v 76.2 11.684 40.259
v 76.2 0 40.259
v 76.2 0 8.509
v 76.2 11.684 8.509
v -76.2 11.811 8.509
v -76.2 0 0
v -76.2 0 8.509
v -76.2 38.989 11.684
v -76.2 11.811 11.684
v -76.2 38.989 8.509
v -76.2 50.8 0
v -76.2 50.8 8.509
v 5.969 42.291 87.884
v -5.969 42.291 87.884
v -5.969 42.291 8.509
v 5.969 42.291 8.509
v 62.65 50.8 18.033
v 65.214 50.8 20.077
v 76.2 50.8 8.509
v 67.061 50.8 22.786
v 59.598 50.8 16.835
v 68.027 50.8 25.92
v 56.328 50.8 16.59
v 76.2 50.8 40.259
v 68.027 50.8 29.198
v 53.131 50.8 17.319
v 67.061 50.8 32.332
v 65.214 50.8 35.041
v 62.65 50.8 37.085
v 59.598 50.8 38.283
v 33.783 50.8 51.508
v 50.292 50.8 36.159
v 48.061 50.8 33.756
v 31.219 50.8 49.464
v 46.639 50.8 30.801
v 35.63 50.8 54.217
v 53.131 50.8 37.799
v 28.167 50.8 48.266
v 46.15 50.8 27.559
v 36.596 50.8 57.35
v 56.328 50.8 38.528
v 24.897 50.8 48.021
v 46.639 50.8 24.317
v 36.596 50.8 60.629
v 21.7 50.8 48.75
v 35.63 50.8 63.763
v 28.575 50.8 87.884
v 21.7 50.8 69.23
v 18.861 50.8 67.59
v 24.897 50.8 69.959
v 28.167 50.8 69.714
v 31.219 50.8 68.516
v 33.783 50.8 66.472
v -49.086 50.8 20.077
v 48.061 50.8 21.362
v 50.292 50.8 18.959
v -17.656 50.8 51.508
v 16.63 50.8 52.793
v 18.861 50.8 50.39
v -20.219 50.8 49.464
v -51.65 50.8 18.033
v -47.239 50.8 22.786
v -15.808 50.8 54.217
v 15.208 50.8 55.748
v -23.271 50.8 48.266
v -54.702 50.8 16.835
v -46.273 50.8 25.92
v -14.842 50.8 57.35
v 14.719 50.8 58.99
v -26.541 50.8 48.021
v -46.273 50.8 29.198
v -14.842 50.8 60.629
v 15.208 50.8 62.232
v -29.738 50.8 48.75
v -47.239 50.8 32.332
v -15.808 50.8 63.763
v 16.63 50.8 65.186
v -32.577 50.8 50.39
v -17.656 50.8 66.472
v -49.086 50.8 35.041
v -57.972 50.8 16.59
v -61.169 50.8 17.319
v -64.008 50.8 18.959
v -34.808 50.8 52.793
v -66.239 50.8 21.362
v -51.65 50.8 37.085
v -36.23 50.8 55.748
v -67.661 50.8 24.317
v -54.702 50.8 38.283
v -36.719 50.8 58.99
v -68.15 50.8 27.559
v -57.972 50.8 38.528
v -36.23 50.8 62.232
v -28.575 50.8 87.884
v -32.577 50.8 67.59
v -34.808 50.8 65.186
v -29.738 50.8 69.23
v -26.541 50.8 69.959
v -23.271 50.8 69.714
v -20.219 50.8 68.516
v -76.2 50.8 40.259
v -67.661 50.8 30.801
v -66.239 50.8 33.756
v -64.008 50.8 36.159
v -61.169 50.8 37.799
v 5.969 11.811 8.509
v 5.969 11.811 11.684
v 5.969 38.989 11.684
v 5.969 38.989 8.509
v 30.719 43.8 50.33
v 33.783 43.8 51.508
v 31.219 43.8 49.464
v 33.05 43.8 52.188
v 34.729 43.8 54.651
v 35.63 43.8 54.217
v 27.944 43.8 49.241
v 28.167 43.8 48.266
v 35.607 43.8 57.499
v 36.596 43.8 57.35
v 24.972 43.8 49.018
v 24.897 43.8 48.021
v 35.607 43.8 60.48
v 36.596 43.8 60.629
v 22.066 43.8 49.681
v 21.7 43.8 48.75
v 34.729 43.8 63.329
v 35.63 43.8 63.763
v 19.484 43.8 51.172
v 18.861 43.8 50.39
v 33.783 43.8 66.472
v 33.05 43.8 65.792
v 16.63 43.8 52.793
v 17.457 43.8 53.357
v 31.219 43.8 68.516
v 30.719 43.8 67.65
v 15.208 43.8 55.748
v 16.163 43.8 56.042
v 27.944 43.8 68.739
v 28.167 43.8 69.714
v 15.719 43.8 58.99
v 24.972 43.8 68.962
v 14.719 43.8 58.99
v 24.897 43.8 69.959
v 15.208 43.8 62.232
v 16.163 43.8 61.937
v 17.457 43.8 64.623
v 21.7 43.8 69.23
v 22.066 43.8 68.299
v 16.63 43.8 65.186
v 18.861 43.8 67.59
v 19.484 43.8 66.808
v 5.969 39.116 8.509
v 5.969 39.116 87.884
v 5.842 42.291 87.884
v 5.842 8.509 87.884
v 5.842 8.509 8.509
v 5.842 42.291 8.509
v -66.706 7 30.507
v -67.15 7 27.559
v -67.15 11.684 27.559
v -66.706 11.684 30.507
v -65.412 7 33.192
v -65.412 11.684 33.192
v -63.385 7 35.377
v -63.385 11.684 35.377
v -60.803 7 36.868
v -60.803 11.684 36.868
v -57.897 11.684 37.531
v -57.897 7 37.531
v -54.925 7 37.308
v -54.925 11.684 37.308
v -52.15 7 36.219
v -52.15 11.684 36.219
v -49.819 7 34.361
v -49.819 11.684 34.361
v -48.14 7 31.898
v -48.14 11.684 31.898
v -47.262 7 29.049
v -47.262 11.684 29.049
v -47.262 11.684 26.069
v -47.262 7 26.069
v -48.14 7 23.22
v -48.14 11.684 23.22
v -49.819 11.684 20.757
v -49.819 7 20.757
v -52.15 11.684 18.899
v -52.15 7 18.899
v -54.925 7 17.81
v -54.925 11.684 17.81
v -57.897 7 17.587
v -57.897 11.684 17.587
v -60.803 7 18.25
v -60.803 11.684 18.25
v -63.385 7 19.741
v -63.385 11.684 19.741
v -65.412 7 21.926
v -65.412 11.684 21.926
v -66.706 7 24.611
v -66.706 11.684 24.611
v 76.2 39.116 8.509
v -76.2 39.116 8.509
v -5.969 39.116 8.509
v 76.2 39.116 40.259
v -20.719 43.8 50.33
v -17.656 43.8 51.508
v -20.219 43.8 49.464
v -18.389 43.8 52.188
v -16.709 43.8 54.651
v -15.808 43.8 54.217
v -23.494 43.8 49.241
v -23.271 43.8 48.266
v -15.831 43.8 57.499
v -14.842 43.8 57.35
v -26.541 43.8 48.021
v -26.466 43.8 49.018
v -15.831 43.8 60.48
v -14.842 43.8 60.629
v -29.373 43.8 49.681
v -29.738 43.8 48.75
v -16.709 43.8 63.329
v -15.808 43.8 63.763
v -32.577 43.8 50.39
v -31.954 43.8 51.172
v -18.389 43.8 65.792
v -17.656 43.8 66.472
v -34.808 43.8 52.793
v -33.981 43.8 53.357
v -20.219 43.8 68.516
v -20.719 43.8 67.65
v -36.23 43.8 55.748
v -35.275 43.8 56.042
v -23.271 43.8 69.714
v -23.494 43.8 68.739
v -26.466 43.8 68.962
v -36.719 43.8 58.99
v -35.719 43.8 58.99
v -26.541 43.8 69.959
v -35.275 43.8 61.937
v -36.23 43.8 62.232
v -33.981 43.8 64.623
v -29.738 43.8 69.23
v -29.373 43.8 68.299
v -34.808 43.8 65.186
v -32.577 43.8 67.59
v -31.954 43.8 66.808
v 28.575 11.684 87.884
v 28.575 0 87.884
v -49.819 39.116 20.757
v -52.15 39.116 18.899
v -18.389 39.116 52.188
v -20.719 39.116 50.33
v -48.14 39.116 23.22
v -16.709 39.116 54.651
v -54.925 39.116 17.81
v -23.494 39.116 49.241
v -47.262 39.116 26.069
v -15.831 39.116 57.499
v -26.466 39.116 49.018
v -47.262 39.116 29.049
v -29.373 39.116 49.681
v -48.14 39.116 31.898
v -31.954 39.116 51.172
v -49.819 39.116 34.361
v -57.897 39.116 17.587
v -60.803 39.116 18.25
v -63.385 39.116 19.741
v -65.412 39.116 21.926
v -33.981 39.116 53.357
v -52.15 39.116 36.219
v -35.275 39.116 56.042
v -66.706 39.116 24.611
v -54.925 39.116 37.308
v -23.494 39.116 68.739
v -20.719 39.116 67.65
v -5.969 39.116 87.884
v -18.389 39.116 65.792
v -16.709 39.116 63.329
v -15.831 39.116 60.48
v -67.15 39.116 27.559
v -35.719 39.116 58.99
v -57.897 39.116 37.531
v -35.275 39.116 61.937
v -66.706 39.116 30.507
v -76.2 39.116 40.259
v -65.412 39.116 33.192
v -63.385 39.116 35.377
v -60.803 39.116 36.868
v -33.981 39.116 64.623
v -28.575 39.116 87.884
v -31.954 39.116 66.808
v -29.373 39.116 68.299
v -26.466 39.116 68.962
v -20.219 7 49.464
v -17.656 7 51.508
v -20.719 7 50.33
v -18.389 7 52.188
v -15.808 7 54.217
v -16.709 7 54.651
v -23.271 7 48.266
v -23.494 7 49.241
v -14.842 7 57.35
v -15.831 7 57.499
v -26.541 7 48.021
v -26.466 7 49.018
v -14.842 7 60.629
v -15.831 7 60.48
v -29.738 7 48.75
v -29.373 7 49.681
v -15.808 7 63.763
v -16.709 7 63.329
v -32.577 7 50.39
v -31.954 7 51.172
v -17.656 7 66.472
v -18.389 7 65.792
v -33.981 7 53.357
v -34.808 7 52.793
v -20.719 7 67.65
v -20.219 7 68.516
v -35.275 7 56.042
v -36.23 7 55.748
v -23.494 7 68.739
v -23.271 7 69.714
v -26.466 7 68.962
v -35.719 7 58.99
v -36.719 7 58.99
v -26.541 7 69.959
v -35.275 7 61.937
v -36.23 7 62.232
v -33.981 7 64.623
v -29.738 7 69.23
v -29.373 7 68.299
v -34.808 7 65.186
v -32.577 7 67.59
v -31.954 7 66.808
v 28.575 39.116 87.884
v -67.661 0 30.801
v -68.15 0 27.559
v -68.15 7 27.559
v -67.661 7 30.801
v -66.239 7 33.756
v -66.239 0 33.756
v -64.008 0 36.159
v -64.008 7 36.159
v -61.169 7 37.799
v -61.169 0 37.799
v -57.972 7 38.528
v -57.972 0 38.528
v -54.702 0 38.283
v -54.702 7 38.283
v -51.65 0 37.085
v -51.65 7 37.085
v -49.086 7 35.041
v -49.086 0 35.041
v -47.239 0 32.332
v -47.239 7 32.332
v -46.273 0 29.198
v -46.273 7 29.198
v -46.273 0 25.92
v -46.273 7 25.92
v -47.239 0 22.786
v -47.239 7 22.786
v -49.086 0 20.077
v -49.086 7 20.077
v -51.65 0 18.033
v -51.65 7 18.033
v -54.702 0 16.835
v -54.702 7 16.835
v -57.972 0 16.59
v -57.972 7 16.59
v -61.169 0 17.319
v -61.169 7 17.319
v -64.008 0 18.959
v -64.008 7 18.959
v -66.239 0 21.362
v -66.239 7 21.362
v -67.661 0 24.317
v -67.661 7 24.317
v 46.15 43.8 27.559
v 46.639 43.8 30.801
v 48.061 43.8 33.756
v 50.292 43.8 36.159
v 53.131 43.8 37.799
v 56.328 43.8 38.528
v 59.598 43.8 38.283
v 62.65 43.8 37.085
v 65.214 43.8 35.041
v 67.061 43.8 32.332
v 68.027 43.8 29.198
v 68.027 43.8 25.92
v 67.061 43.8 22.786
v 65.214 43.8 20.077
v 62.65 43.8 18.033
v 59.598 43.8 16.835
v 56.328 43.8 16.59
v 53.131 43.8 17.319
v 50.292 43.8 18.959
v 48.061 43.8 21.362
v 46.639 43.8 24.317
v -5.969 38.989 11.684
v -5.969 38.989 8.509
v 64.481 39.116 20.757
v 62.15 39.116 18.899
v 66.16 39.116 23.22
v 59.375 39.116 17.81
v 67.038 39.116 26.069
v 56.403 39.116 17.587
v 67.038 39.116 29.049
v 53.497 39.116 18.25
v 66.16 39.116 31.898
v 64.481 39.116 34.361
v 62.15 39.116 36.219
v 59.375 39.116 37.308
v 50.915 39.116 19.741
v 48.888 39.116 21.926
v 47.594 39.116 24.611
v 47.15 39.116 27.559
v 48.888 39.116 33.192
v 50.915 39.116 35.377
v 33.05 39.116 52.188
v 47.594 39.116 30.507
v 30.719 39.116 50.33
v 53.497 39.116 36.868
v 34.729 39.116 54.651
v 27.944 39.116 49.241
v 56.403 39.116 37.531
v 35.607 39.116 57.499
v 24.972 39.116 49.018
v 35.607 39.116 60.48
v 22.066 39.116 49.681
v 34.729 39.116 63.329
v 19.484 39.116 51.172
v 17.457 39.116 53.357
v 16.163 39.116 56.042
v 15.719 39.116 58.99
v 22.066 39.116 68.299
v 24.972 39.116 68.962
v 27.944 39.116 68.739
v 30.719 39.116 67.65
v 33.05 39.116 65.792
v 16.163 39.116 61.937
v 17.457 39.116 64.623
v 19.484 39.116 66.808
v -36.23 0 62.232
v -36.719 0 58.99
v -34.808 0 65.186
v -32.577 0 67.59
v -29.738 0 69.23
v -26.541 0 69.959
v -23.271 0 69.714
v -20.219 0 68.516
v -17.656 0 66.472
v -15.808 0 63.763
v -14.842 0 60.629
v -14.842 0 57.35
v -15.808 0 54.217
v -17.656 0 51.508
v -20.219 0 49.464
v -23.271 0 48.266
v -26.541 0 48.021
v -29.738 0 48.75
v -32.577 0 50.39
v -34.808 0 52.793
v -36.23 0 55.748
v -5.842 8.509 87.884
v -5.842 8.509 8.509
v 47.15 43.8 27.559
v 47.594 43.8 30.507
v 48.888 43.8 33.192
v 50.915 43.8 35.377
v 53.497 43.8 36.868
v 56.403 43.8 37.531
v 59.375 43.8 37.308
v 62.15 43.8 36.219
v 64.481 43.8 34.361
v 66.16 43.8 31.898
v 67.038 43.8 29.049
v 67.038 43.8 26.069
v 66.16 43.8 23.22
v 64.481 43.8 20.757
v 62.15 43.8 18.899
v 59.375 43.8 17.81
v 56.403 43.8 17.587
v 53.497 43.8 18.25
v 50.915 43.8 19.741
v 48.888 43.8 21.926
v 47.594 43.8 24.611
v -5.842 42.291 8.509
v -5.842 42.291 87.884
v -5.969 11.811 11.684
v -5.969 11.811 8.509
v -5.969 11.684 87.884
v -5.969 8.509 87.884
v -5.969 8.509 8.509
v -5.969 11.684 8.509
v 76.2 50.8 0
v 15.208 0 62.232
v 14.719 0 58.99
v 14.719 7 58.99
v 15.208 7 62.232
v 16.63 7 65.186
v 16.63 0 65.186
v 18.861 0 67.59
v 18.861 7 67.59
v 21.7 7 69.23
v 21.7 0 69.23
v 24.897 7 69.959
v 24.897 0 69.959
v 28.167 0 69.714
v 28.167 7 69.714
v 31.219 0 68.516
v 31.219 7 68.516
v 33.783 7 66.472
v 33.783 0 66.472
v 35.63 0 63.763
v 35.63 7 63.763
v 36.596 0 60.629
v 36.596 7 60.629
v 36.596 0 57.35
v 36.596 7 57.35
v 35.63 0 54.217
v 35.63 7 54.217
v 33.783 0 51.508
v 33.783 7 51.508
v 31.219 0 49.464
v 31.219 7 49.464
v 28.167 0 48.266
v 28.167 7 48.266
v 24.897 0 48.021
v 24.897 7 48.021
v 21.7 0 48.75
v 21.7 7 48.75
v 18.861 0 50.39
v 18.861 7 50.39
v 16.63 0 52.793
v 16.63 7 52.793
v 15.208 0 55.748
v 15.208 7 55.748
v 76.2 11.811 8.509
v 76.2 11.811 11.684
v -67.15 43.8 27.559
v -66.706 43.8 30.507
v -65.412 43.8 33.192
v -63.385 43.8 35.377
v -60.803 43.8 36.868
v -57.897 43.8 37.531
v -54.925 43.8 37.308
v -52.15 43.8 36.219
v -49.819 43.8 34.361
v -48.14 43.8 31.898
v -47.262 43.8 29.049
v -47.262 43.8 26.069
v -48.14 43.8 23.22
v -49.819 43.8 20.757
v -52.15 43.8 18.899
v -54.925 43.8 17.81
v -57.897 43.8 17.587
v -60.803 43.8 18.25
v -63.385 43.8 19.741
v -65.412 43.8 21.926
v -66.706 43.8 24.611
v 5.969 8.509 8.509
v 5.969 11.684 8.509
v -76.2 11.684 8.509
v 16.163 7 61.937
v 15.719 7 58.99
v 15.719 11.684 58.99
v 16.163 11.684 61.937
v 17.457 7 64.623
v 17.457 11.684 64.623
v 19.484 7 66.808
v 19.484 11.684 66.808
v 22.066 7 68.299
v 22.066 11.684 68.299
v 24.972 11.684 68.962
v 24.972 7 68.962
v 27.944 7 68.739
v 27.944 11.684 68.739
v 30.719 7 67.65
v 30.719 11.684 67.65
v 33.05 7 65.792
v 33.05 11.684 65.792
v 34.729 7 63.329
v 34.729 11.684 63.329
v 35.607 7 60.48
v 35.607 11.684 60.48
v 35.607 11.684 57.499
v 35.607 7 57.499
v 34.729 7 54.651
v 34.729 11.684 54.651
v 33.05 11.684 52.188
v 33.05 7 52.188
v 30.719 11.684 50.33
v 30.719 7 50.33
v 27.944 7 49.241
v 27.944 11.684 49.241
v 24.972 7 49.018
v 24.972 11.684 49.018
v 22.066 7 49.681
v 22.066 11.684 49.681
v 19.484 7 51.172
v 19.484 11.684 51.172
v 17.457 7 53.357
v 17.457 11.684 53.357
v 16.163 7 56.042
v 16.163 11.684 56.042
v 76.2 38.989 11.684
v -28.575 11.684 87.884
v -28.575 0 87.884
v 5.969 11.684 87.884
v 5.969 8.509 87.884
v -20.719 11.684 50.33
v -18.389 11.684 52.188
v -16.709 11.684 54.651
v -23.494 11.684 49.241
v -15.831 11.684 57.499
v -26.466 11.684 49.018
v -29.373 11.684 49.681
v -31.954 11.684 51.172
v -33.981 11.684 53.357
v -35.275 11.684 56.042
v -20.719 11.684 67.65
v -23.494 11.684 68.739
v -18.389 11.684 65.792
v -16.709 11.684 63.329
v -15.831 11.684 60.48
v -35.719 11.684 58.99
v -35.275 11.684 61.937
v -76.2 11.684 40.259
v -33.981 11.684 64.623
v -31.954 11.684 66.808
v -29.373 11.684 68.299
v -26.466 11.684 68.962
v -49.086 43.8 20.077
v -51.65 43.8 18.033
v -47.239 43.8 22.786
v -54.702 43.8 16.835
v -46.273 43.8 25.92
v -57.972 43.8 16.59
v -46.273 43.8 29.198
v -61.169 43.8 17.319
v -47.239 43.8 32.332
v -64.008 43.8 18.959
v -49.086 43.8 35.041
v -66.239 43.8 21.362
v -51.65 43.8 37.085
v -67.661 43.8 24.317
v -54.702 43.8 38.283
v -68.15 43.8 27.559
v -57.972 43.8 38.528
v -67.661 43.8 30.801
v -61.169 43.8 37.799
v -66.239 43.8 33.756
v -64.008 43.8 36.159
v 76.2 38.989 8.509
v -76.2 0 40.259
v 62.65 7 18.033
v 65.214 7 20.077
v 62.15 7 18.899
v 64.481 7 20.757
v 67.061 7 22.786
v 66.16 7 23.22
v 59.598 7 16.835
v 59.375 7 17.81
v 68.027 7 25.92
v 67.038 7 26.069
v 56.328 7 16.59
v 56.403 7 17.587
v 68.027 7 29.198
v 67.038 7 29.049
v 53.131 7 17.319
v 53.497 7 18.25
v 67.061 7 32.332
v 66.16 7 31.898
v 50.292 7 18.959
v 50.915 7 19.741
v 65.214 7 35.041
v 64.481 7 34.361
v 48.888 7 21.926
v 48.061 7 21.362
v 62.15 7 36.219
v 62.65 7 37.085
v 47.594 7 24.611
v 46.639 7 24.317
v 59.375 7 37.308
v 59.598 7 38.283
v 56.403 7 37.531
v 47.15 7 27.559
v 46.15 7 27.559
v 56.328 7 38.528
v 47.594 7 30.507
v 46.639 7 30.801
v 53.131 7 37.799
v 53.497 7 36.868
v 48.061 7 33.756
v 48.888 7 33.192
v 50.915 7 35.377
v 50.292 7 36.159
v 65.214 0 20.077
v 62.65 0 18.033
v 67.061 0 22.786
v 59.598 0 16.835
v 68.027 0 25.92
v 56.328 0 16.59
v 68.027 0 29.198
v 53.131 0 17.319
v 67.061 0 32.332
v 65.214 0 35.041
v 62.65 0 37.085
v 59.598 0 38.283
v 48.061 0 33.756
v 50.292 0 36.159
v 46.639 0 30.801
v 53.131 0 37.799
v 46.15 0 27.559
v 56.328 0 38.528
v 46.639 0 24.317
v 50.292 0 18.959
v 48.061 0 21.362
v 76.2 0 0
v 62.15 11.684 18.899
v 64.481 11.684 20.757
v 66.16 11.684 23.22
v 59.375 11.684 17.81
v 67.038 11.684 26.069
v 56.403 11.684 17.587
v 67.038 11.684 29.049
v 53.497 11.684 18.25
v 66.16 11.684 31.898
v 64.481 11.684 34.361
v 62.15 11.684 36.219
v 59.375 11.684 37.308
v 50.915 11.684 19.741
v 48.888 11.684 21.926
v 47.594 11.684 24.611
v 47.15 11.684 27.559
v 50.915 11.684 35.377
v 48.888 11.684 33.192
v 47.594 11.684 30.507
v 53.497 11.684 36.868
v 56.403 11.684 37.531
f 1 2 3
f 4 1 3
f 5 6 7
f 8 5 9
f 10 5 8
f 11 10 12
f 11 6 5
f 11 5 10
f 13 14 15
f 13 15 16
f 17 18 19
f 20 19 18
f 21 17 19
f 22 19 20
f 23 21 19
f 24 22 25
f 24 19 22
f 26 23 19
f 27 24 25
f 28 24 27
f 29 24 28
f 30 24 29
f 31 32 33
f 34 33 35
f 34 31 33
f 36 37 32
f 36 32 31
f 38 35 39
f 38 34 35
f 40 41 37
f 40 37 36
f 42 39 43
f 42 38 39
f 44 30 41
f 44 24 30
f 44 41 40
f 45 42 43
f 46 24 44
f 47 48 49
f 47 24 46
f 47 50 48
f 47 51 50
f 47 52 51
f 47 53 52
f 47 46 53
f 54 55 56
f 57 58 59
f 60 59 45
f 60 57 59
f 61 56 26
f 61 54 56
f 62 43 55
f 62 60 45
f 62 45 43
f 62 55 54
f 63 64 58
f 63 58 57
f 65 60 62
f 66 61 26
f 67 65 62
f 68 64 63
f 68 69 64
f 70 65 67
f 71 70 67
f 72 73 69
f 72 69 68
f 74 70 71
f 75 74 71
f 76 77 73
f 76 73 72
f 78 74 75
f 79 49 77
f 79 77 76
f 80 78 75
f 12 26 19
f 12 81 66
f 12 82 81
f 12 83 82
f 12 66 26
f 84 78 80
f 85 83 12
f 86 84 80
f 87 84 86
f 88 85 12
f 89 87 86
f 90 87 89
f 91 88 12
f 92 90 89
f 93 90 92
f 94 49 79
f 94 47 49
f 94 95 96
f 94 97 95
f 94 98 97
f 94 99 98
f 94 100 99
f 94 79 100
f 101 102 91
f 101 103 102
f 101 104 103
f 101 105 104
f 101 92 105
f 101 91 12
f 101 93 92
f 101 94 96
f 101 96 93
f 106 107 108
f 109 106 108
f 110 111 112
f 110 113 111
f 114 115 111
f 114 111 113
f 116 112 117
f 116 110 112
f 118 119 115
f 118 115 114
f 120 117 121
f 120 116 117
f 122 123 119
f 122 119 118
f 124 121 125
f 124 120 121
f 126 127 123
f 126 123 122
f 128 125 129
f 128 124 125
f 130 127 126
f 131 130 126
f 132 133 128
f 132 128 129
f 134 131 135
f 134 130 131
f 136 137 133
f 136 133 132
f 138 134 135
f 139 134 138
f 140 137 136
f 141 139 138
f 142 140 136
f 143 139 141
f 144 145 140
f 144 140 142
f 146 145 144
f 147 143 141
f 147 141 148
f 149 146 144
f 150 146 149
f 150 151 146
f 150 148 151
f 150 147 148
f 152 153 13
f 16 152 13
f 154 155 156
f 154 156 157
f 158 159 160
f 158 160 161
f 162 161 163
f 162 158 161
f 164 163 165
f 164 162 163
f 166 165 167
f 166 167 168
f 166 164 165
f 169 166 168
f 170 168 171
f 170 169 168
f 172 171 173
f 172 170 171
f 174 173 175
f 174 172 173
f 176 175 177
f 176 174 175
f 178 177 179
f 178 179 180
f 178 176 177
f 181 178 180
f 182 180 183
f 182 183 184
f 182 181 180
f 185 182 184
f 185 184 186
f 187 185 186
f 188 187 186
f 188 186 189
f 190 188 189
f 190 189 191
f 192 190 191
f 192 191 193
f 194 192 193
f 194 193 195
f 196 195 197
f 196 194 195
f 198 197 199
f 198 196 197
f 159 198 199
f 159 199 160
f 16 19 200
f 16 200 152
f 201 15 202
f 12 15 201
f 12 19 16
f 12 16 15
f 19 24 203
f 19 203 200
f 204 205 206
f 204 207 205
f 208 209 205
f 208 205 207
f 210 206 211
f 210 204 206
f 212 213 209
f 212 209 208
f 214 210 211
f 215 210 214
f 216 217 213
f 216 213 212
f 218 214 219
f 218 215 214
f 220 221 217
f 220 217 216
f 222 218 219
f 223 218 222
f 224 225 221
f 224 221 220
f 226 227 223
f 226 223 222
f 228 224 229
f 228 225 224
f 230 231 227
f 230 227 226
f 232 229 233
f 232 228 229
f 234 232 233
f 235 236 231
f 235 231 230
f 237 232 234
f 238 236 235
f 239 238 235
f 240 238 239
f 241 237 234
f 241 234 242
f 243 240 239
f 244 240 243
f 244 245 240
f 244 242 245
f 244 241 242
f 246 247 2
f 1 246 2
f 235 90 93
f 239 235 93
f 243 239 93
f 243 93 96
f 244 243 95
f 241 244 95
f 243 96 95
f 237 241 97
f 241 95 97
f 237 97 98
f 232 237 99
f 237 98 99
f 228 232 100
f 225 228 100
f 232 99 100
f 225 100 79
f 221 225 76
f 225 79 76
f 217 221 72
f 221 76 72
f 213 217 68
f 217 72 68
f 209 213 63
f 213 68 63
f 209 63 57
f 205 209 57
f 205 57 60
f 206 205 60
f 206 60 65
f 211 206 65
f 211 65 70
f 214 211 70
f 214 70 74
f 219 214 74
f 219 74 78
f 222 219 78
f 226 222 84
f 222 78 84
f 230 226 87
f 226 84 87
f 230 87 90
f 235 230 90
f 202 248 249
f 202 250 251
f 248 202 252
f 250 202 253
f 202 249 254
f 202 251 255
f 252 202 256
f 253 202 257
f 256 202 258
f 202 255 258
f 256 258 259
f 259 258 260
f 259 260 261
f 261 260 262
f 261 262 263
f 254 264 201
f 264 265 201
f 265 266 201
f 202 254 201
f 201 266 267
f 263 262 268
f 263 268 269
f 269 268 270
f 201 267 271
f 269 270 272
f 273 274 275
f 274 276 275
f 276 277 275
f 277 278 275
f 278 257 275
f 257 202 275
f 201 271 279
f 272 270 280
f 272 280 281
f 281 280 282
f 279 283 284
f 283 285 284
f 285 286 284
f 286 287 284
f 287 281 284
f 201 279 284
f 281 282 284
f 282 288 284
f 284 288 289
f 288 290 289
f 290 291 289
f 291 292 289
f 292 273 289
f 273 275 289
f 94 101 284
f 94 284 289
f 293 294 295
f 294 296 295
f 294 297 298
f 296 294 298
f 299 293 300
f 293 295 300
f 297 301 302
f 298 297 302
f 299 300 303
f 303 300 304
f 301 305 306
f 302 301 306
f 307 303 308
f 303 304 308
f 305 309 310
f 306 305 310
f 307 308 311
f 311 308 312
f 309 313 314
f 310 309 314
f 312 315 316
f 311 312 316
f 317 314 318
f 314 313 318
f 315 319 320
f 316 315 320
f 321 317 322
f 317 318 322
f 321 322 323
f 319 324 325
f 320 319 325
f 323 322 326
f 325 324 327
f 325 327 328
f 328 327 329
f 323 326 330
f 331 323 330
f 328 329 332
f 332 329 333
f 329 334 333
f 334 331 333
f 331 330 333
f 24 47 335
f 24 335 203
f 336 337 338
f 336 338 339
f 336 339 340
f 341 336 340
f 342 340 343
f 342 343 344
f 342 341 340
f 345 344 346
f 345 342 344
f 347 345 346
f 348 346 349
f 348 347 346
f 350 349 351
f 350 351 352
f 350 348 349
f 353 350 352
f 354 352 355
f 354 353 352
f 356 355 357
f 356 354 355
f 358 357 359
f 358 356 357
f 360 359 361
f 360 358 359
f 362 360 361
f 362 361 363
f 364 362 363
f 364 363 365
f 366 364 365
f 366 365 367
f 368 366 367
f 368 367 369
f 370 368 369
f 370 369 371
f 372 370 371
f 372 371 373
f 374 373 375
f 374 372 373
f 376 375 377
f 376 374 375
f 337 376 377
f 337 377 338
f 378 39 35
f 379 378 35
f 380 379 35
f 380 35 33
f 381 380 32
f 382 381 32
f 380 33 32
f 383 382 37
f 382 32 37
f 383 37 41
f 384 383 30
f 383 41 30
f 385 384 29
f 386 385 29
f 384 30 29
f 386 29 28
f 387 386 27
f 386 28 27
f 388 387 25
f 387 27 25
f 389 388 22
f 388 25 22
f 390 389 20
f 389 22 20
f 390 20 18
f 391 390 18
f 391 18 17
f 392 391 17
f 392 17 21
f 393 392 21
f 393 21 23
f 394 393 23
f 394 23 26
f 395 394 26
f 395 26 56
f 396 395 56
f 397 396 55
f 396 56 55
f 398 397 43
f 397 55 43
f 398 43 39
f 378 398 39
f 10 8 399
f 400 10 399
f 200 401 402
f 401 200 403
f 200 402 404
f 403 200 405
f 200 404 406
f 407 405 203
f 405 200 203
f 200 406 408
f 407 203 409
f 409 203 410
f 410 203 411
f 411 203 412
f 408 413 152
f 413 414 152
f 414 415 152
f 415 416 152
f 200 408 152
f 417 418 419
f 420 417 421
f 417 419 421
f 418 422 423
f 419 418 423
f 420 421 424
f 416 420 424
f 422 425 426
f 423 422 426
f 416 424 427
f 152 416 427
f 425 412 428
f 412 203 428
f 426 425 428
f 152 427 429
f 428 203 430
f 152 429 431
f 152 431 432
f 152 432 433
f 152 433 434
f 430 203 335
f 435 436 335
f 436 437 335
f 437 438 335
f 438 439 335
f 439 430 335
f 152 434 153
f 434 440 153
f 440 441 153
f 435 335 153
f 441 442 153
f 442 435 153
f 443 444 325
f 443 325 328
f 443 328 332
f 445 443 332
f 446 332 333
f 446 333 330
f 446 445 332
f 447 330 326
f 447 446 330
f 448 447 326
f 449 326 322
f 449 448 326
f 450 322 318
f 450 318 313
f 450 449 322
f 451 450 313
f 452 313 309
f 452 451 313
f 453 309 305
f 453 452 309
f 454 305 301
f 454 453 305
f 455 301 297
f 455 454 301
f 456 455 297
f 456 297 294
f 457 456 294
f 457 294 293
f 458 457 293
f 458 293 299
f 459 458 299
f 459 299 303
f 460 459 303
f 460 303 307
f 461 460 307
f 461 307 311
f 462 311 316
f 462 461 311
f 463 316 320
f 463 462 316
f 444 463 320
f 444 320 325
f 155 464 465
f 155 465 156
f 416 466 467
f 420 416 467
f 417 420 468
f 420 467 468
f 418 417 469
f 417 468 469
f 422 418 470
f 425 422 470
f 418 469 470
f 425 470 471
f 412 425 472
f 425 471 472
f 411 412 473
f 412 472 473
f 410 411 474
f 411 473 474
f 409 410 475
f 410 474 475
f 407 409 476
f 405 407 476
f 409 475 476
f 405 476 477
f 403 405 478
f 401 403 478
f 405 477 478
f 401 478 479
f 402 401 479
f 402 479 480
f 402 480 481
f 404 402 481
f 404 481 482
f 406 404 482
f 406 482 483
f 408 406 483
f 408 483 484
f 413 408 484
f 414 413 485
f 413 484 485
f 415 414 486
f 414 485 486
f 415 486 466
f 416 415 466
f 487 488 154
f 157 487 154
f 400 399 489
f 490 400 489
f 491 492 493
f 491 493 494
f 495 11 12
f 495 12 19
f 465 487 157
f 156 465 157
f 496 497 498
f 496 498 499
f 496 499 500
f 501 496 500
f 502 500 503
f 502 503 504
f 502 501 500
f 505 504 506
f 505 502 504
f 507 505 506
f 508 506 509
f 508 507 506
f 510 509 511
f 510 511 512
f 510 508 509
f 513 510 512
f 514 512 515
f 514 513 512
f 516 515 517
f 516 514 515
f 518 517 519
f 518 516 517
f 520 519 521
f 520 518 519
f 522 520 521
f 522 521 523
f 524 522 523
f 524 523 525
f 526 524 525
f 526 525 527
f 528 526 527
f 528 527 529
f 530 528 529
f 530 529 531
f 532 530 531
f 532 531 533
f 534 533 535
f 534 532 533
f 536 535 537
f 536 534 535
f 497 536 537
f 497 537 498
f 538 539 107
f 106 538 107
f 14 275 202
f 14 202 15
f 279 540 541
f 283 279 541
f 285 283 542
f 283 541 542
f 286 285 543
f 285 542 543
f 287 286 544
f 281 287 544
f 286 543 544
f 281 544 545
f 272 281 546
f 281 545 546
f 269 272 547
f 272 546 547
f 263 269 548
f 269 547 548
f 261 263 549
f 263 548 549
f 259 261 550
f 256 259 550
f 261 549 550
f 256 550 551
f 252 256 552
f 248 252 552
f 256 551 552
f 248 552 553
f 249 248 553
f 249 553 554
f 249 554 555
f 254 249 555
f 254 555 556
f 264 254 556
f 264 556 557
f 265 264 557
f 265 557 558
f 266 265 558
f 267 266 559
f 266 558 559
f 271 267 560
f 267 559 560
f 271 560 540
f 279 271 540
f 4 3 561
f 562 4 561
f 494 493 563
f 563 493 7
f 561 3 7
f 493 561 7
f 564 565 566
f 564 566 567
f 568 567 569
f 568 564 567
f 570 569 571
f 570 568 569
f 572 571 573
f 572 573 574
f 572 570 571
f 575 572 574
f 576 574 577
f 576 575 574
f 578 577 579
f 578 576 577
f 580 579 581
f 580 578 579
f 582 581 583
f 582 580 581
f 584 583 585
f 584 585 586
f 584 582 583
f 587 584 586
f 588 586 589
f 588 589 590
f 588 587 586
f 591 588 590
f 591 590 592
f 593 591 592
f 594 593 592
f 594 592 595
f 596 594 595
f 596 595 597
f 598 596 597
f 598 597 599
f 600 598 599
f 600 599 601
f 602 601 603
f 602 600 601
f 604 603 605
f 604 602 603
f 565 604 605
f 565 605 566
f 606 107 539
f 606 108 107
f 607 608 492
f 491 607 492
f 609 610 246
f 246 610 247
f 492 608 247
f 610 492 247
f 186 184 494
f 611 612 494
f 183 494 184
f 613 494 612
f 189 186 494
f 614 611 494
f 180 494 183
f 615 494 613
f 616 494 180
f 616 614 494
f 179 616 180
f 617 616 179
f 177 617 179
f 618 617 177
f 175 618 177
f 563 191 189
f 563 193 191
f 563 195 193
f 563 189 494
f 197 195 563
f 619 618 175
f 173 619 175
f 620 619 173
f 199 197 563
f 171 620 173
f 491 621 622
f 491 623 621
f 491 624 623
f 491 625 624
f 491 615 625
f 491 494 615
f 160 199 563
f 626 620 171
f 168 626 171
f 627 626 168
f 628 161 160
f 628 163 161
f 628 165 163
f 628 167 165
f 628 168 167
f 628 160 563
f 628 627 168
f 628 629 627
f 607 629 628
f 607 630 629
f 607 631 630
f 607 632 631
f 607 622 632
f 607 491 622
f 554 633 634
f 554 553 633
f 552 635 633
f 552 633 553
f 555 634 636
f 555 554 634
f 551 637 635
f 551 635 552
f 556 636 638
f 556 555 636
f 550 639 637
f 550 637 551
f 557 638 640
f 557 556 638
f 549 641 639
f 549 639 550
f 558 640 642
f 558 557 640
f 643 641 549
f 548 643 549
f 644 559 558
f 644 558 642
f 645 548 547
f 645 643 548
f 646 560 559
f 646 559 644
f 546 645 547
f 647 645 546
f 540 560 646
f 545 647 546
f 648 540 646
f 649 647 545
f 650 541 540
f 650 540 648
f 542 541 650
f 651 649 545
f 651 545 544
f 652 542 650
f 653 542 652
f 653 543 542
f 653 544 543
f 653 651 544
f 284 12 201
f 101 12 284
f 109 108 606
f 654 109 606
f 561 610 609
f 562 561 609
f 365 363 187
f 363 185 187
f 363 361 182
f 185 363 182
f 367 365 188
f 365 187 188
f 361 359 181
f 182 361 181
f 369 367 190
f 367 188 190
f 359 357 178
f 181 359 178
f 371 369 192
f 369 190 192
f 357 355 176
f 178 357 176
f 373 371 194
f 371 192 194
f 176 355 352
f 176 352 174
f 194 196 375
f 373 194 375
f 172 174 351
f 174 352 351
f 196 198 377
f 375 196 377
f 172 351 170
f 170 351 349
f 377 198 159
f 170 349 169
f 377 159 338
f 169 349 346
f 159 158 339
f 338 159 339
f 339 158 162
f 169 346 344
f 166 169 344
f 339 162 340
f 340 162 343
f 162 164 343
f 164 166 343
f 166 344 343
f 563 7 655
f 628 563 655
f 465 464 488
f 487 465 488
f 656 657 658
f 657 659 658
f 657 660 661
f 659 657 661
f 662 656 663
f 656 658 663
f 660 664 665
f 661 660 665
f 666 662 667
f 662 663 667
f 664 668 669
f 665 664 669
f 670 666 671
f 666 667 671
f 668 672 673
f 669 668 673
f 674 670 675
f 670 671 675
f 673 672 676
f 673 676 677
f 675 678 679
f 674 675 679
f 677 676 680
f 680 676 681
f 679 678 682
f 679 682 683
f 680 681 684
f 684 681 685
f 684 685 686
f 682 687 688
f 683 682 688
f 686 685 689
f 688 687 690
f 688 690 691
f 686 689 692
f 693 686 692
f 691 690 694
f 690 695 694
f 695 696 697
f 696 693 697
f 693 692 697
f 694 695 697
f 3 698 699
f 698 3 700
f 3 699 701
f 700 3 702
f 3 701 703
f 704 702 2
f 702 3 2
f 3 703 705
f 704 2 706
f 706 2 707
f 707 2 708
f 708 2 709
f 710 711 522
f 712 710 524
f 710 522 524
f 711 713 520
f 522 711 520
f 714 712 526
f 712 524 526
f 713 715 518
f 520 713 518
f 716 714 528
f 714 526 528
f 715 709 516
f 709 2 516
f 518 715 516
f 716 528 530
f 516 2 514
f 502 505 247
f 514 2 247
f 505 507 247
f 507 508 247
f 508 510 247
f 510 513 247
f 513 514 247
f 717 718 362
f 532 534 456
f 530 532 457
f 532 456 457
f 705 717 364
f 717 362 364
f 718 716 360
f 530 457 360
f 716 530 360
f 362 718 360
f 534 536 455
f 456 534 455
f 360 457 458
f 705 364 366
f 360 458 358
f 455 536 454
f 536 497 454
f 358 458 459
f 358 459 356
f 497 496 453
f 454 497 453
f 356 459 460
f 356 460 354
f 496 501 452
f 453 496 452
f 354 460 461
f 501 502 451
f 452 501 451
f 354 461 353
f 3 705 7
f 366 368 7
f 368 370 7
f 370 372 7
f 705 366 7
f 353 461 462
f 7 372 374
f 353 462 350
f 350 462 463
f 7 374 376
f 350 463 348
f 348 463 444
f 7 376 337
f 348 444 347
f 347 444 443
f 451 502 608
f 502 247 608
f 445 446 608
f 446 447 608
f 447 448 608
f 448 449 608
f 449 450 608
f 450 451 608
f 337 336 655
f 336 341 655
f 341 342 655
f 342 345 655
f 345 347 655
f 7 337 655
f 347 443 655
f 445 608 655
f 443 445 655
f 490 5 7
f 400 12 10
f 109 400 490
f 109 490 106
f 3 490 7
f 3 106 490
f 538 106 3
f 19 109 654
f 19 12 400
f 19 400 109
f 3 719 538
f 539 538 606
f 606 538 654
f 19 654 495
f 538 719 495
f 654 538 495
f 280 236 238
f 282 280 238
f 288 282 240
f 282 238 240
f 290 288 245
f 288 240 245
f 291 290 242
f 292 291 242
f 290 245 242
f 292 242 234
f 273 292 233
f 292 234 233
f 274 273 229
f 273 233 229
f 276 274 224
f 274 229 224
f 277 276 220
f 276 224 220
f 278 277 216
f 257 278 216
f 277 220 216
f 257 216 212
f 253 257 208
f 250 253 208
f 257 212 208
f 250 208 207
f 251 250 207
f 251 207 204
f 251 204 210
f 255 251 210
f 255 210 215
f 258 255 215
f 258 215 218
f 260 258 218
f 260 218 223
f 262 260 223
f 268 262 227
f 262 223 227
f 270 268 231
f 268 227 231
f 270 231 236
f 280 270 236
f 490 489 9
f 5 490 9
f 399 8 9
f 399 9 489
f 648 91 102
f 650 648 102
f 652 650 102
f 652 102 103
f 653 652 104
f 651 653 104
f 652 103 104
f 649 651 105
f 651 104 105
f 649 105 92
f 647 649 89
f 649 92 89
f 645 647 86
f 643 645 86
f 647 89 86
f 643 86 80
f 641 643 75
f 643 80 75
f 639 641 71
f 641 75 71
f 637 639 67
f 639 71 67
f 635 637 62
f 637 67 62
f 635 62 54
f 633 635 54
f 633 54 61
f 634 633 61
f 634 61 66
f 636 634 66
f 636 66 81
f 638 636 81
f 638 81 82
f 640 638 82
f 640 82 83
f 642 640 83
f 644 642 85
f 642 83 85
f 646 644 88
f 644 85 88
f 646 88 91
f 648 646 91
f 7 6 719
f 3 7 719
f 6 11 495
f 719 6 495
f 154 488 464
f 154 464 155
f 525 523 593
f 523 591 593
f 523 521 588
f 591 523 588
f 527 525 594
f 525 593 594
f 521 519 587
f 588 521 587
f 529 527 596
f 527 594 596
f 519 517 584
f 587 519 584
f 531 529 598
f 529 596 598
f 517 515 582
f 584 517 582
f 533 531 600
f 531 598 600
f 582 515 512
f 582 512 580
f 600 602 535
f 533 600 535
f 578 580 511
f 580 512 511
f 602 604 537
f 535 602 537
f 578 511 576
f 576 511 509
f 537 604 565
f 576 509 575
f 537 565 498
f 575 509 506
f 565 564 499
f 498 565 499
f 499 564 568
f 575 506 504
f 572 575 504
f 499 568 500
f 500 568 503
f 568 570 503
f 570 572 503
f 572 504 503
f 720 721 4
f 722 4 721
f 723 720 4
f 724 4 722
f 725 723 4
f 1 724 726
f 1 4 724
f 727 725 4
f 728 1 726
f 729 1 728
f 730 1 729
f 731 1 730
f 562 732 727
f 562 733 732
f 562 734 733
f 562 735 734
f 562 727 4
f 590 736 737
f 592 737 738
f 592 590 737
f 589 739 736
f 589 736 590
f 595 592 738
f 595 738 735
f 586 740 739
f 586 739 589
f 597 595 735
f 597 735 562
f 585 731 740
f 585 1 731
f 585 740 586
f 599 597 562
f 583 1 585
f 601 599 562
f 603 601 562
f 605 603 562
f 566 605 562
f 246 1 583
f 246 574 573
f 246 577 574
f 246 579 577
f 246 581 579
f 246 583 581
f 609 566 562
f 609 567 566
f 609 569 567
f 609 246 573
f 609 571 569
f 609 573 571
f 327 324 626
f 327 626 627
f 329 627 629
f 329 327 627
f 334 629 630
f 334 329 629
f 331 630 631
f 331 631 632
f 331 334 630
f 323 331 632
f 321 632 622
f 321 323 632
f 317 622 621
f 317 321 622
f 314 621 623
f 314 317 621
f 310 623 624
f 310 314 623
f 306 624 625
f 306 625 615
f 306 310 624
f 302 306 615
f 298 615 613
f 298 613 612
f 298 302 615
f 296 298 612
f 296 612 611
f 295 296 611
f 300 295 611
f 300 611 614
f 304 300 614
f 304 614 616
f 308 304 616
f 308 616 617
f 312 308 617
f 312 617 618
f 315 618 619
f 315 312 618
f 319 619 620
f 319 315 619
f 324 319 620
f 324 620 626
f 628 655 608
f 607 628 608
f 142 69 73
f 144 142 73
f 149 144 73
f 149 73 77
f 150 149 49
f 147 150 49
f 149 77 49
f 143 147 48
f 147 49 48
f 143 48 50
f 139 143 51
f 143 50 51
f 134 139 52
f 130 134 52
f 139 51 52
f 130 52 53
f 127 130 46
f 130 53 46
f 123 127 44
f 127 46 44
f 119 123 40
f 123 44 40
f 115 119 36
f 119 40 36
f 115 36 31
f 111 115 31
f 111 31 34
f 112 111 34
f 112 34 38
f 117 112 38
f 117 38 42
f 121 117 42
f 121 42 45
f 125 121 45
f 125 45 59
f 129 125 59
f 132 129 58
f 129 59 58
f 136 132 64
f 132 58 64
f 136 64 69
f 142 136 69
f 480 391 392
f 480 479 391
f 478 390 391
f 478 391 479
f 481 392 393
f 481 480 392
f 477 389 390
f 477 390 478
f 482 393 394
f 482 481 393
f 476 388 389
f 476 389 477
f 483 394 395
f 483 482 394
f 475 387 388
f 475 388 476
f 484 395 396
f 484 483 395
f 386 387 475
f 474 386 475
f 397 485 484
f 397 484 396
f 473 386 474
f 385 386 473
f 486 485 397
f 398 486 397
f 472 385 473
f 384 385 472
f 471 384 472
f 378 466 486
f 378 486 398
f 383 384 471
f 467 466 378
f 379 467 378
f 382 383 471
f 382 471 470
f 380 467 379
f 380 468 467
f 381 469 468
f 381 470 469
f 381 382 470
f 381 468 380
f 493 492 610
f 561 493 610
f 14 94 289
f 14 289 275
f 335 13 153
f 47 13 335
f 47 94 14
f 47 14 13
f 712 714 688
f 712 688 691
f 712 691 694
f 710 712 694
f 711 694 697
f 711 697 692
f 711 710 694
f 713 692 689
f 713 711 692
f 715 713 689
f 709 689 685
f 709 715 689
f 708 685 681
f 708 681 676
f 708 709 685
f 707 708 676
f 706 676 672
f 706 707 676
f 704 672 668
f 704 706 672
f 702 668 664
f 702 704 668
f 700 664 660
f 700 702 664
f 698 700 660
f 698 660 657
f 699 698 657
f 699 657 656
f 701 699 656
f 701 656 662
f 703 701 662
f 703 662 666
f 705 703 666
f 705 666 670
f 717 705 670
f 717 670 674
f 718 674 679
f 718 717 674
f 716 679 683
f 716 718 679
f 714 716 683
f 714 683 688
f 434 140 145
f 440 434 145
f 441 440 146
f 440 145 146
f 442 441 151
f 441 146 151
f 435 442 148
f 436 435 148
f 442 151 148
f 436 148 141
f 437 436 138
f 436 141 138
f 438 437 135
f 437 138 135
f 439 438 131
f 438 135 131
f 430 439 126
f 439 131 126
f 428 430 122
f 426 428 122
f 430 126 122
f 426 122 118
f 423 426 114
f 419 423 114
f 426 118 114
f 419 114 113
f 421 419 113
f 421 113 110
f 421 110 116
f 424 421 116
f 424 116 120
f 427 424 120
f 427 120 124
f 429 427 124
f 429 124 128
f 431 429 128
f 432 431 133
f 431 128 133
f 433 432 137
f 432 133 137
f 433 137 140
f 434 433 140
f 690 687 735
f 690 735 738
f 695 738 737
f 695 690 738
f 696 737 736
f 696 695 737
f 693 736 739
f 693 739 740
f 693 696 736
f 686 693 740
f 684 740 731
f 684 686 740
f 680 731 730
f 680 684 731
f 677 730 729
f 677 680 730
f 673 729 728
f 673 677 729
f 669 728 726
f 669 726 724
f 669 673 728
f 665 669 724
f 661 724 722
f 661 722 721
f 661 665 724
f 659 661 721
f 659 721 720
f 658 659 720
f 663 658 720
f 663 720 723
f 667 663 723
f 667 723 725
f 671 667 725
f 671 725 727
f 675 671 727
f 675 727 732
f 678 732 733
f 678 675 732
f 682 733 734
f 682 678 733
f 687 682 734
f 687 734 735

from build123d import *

# Parameters (mm, degrees)
F0_W      = 152.4
F0_H      = 50.8
F1_DEPTH  = 11.684
F3_DEPTH  = 11.684
F4_R      = 11
F5_DEPTH  = 7
F6_R      = 10
F7_DEPTH  = 4.684
F13_W     = 11.684
F13_H     = 33.782
F14_DEPTH = 79.375
F16_DEPTH = 3.175
F17_W     = 11.938
F17_H     = 33.782
F18_DEPTH = 79.375


with BuildPart() as f1:
    # F0 (on Top) → F1 (new body)
    with BuildSketch(Plane.XY):
        with Locations((0, 25.4)):
            Rectangle(F0_W, F0_H)
    extrude(amount=F1_DEPTH)

    # F15 (on face) → F16 (cut, through all)
    with BuildSketch(Plane.XY.offset(11.684)):
        Polygon((76.2, 50.8), (-76.2, 50.8), (-76.2, 38.989), (-5.969, 38.989), (-5.969, 11.811), (-76.2, 11.811), (-76.2, -0.127), (76.2, -0.127), (76.2, 11.811), (5.969, 11.811), (5.969, 38.989), (76.2, 38.989), align=None)
    extrude(amount=-F16_DEPTH, mode=Mode.SUBTRACT)


with BuildPart() as f3:
    # F2 (on face) → F3 (new body)
    with BuildSketch(Plane(origin=(0, 50.8, 0), x_dir=(-1, 0, 0), z_dir=(0, 1, 0))):
        Polygon((-76.2, 40.259), (-76.2, 8.509), (76.2, 8.509), (76.2, 40.259), (28.575, 87.884), (-28.575, 87.884), align=None)
    extrude(amount=-F3_DEPTH)

    # F4 (on face) → F5 (cut)
    with BuildSketch(Plane(origin=(0, 50.8, 0), x_dir=(-1, 0, 0), z_dir=(0, 1, 0))):
        with Locations((-57.15, 27.559)):
            Circle(F4_R)
        with Locations((-25.7191035763, 58.9898964237)):
            Circle(F4_R)
        with Locations((25.7191035763, 58.9898964237)):
            Circle(F4_R)
        with Locations((57.15, 27.559)):
            Circle(F4_R)
    extrude(amount=-F5_DEPTH, mode=Mode.SUBTRACT)

    # F6 (on face) → F7 (cut, through all)
    with BuildSketch(Plane(origin=(0, 43.8, 0), x_dir=(-1, 0, 0), z_dir=(0, 1, 0))):
        with Locations((-25.7191035763, 58.9898964237)):
            Circle(F6_R)
        with Locations((-57.15, 27.559)):
            Circle(F6_R)
        with Locations((25.7191035763, 58.9898964237)):
            Circle(F6_R)
        with Locations((57.15, 27.559)):
            Circle(F6_R)
    extrude(amount=-F7_DEPTH, mode=Mode.SUBTRACT)


with BuildPart() as f12_1:
    # F12: instance of F3
    add(f3.part.mirror(Plane(origin=(-76.2, 25.4, 11.684), x_dir=(0, 0, -1), z_dir=(0, 1, 0))))


with BuildPart() as f14:
    # F13 (on face) → F14 (new body, through all)
    with BuildSketch(Plane.XY.offset(87.884)):
        with Locations((0, 25.4)):
            Rectangle(F13_W, F13_H)
    extrude(amount=-F14_DEPTH)


with BuildPart() as f18_tool:
    # F17 (on face) → F18 (new body, through all)
    with BuildSketch(Plane.XY.offset(87.884)):
        with Locations((0, 25.4)):
            Rectangle(F17_W, F17_H)
    extrude(amount=-F18_DEPTH)


with BuildPart() as f3_1:
    add(f3.part)

    # F18: cut by f18_tool
    add(f18_tool.part, mode=Mode.SUBTRACT)


with BuildPart() as f12_1_1:
    add(f12_1.part)

    # F18: cut by f18_tool
    add(f18_tool.part, mode=Mode.SUBTRACT)


solid = Compound([f1.part, f14.part, f3_1.part, f12_1_1.part])
